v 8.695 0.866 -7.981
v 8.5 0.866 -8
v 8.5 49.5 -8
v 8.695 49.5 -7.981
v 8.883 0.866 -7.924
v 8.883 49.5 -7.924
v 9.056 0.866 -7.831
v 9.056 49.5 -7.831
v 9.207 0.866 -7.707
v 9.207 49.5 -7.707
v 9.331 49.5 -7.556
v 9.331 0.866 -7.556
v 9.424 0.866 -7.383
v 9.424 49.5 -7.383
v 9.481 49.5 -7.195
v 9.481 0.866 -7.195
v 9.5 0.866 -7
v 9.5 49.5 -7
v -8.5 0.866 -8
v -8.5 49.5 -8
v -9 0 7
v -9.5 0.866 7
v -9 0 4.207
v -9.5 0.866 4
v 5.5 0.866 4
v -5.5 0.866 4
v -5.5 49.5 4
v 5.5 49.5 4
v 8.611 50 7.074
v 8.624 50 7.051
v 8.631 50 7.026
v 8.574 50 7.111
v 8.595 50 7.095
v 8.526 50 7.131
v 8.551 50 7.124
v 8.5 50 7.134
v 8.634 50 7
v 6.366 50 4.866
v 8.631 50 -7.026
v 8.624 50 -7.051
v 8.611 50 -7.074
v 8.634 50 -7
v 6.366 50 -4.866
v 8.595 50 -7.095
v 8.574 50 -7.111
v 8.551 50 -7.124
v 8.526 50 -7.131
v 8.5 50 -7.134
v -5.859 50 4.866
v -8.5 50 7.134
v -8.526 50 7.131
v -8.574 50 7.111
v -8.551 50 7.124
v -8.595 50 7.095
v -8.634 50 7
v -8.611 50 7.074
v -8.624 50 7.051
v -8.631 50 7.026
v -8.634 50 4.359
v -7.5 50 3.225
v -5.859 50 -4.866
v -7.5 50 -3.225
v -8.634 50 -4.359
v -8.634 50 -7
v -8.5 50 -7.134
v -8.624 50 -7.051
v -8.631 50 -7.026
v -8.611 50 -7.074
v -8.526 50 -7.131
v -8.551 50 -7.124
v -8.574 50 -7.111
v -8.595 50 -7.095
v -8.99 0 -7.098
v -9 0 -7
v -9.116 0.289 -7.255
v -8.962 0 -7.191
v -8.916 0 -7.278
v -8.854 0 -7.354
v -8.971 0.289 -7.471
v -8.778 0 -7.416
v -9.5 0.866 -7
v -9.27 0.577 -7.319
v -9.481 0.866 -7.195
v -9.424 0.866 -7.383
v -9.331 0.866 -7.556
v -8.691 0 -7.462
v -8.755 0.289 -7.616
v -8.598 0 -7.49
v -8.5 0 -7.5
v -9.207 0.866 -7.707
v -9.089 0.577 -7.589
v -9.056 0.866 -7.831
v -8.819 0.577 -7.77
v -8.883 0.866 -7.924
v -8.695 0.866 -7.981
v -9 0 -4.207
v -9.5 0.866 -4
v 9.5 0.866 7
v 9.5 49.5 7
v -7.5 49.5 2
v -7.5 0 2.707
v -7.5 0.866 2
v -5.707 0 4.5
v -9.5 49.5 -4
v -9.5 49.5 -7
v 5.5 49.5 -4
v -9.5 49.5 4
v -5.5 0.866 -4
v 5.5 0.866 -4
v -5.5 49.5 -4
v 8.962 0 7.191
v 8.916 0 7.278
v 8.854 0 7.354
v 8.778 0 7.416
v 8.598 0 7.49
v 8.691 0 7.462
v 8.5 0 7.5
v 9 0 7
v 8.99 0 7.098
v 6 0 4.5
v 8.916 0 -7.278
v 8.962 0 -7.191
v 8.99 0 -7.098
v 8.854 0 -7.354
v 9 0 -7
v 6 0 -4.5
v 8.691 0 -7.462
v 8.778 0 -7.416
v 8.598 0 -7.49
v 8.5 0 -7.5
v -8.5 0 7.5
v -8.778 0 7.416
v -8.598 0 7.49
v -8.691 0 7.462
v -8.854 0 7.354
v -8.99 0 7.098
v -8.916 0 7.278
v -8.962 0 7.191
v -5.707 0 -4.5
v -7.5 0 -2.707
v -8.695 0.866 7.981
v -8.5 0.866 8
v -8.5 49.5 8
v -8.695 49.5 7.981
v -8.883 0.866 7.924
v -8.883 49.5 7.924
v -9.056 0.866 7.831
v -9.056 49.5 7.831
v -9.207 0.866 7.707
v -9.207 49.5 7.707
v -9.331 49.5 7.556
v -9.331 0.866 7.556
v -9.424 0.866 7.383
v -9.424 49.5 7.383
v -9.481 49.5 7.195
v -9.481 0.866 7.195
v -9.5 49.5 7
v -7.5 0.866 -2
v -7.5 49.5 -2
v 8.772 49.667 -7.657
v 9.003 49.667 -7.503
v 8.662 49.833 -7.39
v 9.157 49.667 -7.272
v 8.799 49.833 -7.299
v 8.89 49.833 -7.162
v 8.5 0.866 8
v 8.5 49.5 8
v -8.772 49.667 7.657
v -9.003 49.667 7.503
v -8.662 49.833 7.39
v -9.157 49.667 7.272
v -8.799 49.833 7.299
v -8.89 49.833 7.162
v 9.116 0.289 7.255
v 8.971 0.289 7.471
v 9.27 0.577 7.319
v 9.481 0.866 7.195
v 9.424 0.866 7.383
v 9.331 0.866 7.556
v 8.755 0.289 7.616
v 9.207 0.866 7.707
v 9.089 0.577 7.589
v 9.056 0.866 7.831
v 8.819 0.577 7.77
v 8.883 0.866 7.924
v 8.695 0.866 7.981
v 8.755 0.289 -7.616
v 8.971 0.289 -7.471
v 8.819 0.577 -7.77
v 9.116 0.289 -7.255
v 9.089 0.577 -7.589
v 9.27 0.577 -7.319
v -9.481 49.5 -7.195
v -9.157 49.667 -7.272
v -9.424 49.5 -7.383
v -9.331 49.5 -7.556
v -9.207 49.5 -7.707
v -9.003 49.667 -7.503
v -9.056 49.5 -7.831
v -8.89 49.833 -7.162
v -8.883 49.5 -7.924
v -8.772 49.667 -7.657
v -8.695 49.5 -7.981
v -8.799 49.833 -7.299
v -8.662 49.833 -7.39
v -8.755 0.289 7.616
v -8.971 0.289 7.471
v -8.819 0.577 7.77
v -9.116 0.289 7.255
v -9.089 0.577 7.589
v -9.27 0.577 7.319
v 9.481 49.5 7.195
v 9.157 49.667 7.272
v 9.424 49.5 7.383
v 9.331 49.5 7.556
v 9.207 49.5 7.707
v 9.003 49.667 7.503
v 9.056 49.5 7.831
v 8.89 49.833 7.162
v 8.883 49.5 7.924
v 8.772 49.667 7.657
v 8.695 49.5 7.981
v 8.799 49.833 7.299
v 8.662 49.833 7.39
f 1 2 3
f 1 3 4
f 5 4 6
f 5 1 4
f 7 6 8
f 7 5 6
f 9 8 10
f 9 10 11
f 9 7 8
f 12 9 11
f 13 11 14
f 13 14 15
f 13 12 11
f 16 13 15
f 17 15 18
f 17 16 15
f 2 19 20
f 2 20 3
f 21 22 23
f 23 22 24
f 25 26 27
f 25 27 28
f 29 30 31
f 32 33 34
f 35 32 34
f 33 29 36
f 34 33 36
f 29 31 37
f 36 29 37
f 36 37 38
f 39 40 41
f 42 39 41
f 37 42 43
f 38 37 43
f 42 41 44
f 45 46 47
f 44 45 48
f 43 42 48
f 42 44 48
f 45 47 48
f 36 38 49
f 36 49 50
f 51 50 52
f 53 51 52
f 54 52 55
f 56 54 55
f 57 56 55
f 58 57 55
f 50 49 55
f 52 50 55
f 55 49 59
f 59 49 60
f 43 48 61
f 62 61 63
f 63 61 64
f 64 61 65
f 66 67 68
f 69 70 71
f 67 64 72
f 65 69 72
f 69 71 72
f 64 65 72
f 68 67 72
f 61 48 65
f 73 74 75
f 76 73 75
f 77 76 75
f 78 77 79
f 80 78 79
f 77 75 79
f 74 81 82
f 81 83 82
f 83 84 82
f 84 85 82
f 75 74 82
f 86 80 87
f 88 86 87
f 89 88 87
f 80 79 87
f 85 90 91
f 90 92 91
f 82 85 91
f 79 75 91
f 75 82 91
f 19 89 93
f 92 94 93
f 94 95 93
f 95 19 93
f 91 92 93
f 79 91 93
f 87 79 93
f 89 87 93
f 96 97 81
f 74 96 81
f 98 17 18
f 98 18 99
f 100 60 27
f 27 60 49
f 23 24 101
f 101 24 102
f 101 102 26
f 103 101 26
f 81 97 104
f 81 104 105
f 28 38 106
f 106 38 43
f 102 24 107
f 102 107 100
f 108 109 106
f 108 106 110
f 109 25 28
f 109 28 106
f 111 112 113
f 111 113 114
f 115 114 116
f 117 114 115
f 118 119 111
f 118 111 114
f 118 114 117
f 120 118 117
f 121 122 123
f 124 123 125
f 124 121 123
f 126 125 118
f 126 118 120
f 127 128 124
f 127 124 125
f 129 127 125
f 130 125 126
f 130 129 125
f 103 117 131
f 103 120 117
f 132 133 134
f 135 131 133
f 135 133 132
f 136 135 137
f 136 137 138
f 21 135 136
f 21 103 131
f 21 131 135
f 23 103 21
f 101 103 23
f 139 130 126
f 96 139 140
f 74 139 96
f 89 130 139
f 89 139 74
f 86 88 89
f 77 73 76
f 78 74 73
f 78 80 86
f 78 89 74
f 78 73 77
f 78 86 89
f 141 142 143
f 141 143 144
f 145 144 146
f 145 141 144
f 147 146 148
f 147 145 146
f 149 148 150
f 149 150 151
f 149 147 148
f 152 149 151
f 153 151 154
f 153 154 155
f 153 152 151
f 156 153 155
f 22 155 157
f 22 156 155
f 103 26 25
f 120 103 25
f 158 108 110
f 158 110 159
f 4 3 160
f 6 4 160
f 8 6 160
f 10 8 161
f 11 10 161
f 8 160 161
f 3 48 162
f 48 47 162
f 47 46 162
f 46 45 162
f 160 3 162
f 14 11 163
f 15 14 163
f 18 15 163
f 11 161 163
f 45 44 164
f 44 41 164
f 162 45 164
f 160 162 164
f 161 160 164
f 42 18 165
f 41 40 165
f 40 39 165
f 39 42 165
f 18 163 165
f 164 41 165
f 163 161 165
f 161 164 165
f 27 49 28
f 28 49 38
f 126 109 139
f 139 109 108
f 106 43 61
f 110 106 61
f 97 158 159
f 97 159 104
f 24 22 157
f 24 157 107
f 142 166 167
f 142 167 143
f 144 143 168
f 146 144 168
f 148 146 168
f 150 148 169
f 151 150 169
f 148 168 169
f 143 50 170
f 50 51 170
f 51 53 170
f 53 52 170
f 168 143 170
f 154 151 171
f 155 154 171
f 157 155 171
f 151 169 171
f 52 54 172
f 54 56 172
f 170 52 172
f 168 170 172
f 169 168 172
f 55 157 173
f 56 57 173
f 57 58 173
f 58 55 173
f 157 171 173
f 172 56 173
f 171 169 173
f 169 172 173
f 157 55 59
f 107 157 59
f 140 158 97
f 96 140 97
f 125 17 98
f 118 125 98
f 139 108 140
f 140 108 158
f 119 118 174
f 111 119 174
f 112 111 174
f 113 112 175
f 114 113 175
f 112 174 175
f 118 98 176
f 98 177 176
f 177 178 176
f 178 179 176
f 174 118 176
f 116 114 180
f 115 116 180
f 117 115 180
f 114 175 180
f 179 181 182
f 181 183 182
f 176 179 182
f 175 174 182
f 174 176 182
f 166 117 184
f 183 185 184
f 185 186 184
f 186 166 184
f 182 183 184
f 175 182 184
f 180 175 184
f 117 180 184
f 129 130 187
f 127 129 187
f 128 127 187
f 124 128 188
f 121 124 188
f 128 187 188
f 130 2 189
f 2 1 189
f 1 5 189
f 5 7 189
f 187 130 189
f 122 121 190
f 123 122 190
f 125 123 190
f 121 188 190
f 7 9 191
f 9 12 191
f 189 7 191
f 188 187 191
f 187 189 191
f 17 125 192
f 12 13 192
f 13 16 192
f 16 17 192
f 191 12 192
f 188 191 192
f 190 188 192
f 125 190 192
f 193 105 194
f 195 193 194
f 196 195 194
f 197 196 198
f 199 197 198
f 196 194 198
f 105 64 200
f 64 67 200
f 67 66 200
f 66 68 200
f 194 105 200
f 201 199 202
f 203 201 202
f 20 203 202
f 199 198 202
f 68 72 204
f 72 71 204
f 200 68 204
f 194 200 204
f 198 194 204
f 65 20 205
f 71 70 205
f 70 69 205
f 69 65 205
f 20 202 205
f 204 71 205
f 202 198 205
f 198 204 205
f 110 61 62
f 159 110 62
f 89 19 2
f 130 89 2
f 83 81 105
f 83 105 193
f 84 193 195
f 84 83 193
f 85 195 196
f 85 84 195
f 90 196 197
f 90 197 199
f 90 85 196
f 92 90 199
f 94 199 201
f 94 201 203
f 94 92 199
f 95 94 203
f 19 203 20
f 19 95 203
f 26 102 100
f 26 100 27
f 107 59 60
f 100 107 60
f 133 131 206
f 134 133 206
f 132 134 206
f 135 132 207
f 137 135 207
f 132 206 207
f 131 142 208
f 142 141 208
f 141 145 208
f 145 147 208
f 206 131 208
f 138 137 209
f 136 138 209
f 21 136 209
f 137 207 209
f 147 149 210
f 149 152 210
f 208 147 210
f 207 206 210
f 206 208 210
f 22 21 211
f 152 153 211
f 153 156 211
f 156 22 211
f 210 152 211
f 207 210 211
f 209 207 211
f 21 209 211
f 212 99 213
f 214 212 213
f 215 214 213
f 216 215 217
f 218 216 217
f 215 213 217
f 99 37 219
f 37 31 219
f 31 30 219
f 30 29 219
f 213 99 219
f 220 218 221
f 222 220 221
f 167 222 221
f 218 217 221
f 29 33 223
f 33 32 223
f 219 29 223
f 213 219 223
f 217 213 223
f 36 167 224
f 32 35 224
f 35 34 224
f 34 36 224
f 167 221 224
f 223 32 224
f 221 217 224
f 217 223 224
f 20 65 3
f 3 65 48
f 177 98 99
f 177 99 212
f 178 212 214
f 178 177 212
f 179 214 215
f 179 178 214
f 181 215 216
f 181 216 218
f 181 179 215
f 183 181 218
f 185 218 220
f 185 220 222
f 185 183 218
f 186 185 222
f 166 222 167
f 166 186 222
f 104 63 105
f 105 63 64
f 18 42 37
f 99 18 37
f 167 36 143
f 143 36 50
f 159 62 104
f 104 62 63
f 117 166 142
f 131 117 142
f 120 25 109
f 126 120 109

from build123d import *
from OCP.BRepFilletAPI import BRepFilletAPI_MakeChamfer

# Parameters (mm, degrees)
SALIENTE_EXTRUIR2_DEPTH = 50
CHAFL_N1_SIZE           = 0.5
CHAFL_N1_SIZE2          = 0.866025404


with BuildPart() as part:
    # Croquis1 → Saliente-Extruir2 (new body)
    with BuildSketch(Plane(origin=(0, 0, 0), x_dir=(1, 0, 0), z_dir=(0, 1, 0))):
        with BuildLine():
            Line((-5.5, 4), (-7.5, 2))
            Line((-7.5, 2), (-9.5, 4))
            Line((-9.5, 4), (-9.5, 7))
            ThreePointArc((-9.5, 7), (-9.207106781, 7.707106781), (-8.5, 8))
            Line((-8.5, 8), (8.5, 8))
            ThreePointArc((8.5, 8), (9.207106781, 7.707106781), (9.5, 7))
            Line((9.5, 7), (9.5, -7))
            ThreePointArc((9.5, -7), (9.207106781, -7.707106781), (8.5, -8))
            Line((8.5, -8), (-8.5, -8))
            ThreePointArc((-8.5, -8), (-9.207106781, -7.707106781), (-9.5, -7))
            Line((-9.5, -7), (-9.5, -4))
            Line((-9.5, -4), (-7.5, -2))
            Line((-7.5, -2), (-5.5, -4))
            Line((-5.5, -4), (5.5, -4))
            Line((5.5, -4), (5.5, 4))
            Line((5.5, 4), (-5.5, 4))
        make_face()
    extrude(amount=SALIENTE_EXTRUIR2_DEPTH)

    # Chaflán1: one chamfer whose edges measure the first distance from different faces: ONE call of the kernel's chamfer builder (chamfer() names one face for all edges)
    chafl_n1_edges_1 = [part.edges().sort_by_distance(p)[0] for p in [
        (0, 50, 4),
    ]]
    chafl_n1_side_1 = [part.faces().sort_by_distance(p)[0] for p in [
        (0, 25, 4),
    ]]
    chafl_n1_edges_2 = [part.edges().sort_by_distance(p)[0] for p in [
        (-6.5, 50, 3),
    ]]
    chafl_n1_side_2 = [part.faces().sort_by_distance(p)[0] for p in [
        (-6.5, 25, 3),
    ]]
    chafl_n1_edges_3 = [part.edges().sort_by_distance(p)[0] for p in [
        (-6.5, 0, -3),
        (-8.5, 0, -3),
        (-9.5, 0, -5.5),
        (-9.207106781, 0, -7.707106781),
        (0, 0, -8),
        (9.207106781, 0, -7.707106781),
        (9.5, 0, 0),
        (9.207106781, 0, 7.707106781),
        (0, 0, 8),
        (-9.207106781, 0, 7.707106781),
        (-9.5, 0, 5.5),
        (-8.5, 0, 3),
        (-6.5, 0, 3),
        (0, 0, 4),
        (5.5, 0, 0),
        (0, 0, -4),
    ]]
    chafl_n1_side_3 = [part.faces().sort_by_distance(p)[0] for p in [
        (-9.0314651, 0, 7.5314651),
    ]]
    chafl_n1_edges_4 = [part.edges().sort_by_distance(p)[0] for p in [
        (-8.5, 50, 3),
    ]]
    chafl_n1_side_4 = [part.faces().sort_by_distance(p)[0] for p in [
        (-8.5, 25, 3),
    ]]
    chafl_n1_edges_5 = [part.edges().sort_by_distance(p)[0] for p in [
        (-9.5, 50, 5.5),
    ]]
    chafl_n1_side_5 = [part.faces().sort_by_distance(p)[0] for p in [
        (-9.5, 25, 5.5),
    ]]
    chafl_n1_edges_6 = [part.edges().sort_by_distance(p)[0] for p in [
        (-9.207106781, 50, 7.707106781),
    ]]
    chafl_n1_side_6 = [part.faces().sort_by_distance(p)[0] for p in [
        (-9.207106781, 25, 7.707106781),
    ]]
    chafl_n1_edges_7 = [part.edges().sort_by_distance(p)[0] for p in [
        (0, 50, 8),
    ]]
    chafl_n1_side_7 = [part.faces().sort_by_distance(p)[0] for p in [
        (0, 25, 8),
    ]]
    chafl_n1_edges_8 = [part.edges().sort_by_distance(p)[0] for p in [
        (9.207106781, 50, 7.707106781),
    ]]
    chafl_n1_side_8 = [part.faces().sort_by_distance(p)[0] for p in [
        (9.207106781, 25, 7.707106781),
    ]]
    chafl_n1_edges_9 = [part.edges().sort_by_distance(p)[0] for p in [
        (9.5, 50, 0),
    ]]
    chafl_n1_side_9 = [part.faces().sort_by_distance(p)[0] for p in [
        (9.5, 25, 0),
    ]]
    chafl_n1_edges_10 = [part.edges().sort_by_distance(p)[0] for p in [
        (9.207106781, 50, -7.707106781),
    ]]
    chafl_n1_side_10 = [part.faces().sort_by_distance(p)[0] for p in [
        (9.207106781, 25, -7.707106781),
    ]]
    chafl_n1_edges_11 = [part.edges().sort_by_distance(p)[0] for p in [
        (0, 50, -8),
    ]]
    chafl_n1_side_11 = [part.faces().sort_by_distance(p)[0] for p in [
        (0, 25, -8),
    ]]
    chafl_n1_edges_12 = [part.edges().sort_by_distance(p)[0] for p in [
        (0, 50, -4),
    ]]
    chafl_n1_side_12 = [part.faces().sort_by_distance(p)[0] for p in [
        (0, 25, -4),
    ]]
    chafl_n1_edges_13 = [part.edges().sort_by_distance(p)[0] for p in [
        (-9.207106781, 50, -7.707106781),
    ]]
    chafl_n1_side_13 = [part.faces().sort_by_distance(p)[0] for p in [
        (-9.207106781, 25, -7.707106781),
    ]]
    chafl_n1_edges_14 = [part.edges().sort_by_distance(p)[0] for p in [
        (-9.5, 50, -5.5),
    ]]
    chafl_n1_side_14 = [part.faces().sort_by_distance(p)[0] for p in [
        (-9.5, 25, -5.5),
    ]]
    chafl_n1_edges_15 = [part.edges().sort_by_distance(p)[0] for p in [
        (-8.5, 50, -3),
    ]]
    chafl_n1_side_15 = [part.faces().sort_by_distance(p)[0] for p in [
        (-8.5, 25, -3),
    ]]
    chafl_n1_edges_16 = [part.edges().sort_by_distance(p)[0] for p in [
        (-6.5, 50, -3),
    ]]
    chafl_n1_side_16 = [part.faces().sort_by_distance(p)[0] for p in [
        (-6.5, 25, -3),
    ]]
    chafl_n1_edges_17 = [part.edges().sort_by_distance(p)[0] for p in [
        (5.5, 50, 0),
    ]]
    chafl_n1_side_17 = [part.faces().sort_by_distance(p)[0] for p in [
        (5.5, 25, 0),
    ]]
    chafl_n1 = BRepFilletAPI_MakeChamfer(part.part.solid().wrapped)
    for e in chafl_n1_edges_1:
        chafl_n1.Add(CHAFL_N1_SIZE, CHAFL_N1_SIZE2, e.wrapped, chafl_n1_side_1[0].wrapped)  # the first distance lies on this face
    for e in chafl_n1_edges_2:
        chafl_n1.Add(CHAFL_N1_SIZE, CHAFL_N1_SIZE2, e.wrapped, chafl_n1_side_2[0].wrapped)  # the first distance lies on this face
    for e in chafl_n1_edges_3:
        chafl_n1.Add(CHAFL_N1_SIZE, CHAFL_N1_SIZE2, e.wrapped, chafl_n1_side_3[0].wrapped)  # the first distance lies on this face
    for e in chafl_n1_edges_4:
        chafl_n1.Add(CHAFL_N1_SIZE, CHAFL_N1_SIZE2, e.wrapped, chafl_n1_side_4[0].wrapped)  # the first distance lies on this face
    for e in chafl_n1_edges_5:
        chafl_n1.Add(CHAFL_N1_SIZE, CHAFL_N1_SIZE2, e.wrapped, chafl_n1_side_5[0].wrapped)  # the first distance lies on this face
    for e in chafl_n1_edges_6:
        chafl_n1.Add(CHAFL_N1_SIZE, CHAFL_N1_SIZE2, e.wrapped, chafl_n1_side_6[0].wrapped)  # the first distance lies on this face
    for e in chafl_n1_edges_7:
        chafl_n1.Add(CHAFL_N1_SIZE, CHAFL_N1_SIZE2, e.wrapped, chafl_n1_side_7[0].wrapped)  # the first distance lies on this face
    for e in chafl_n1_edges_8:
        chafl_n1.Add(CHAFL_N1_SIZE, CHAFL_N1_SIZE2, e.wrapped, chafl_n1_side_8[0].wrapped)  # the first distance lies on this face
    for e in chafl_n1_edges_9:
        chafl_n1.Add(CHAFL_N1_SIZE, CHAFL_N1_SIZE2, e.wrapped, chafl_n1_side_9[0].wrapped)  # the first distance lies on this face
    for e in chafl_n1_edges_10:
        chafl_n1.Add(CHAFL_N1_SIZE, CHAFL_N1_SIZE2, e.wrapped, chafl_n1_side_10[0].wrapped)  # the first distance lies on this face
    for e in chafl_n1_edges_11:
        chafl_n1.Add(CHAFL_N1_SIZE, CHAFL_N1_SIZE2, e.wrapped, chafl_n1_side_11[0].wrapped)  # the first distance lies on this face
    for e in chafl_n1_edges_12:
        chafl_n1.Add(CHAFL_N1_SIZE, CHAFL_N1_SIZE2, e.wrapped, chafl_n1_side_12[0].wrapped)  # the first distance lies on this face
    for e in chafl_n1_edges_13:
        chafl_n1.Add(CHAFL_N1_SIZE, CHAFL_N1_SIZE2, e.wrapped, chafl_n1_side_13[0].wrapped)  # the first distance lies on this face
    for e in chafl_n1_edges_14:
        chafl_n1.Add(CHAFL_N1_SIZE, CHAFL_N1_SIZE2, e.wrapped, chafl_n1_side_14[0].wrapped)  # the first distance lies on this face
    for e in chafl_n1_edges_15:
        chafl_n1.Add(CHAFL_N1_SIZE, CHAFL_N1_SIZE2, e.wrapped, chafl_n1_side_15[0].wrapped)  # the first distance lies on this face
    for e in chafl_n1_edges_16:
        chafl_n1.Add(CHAFL_N1_SIZE, CHAFL_N1_SIZE2, e.wrapped, chafl_n1_side_16[0].wrapped)  # the first distance lies on this face
    for e in chafl_n1_edges_17:
        chafl_n1.Add(CHAFL_N1_SIZE, CHAFL_N1_SIZE2, e.wrapped, chafl_n1_side_17[0].wrapped)  # the first distance lies on this face
    add(Compound.cast(chafl_n1.Shape()), mode=Mode.REPLACE)


solid = part.part
